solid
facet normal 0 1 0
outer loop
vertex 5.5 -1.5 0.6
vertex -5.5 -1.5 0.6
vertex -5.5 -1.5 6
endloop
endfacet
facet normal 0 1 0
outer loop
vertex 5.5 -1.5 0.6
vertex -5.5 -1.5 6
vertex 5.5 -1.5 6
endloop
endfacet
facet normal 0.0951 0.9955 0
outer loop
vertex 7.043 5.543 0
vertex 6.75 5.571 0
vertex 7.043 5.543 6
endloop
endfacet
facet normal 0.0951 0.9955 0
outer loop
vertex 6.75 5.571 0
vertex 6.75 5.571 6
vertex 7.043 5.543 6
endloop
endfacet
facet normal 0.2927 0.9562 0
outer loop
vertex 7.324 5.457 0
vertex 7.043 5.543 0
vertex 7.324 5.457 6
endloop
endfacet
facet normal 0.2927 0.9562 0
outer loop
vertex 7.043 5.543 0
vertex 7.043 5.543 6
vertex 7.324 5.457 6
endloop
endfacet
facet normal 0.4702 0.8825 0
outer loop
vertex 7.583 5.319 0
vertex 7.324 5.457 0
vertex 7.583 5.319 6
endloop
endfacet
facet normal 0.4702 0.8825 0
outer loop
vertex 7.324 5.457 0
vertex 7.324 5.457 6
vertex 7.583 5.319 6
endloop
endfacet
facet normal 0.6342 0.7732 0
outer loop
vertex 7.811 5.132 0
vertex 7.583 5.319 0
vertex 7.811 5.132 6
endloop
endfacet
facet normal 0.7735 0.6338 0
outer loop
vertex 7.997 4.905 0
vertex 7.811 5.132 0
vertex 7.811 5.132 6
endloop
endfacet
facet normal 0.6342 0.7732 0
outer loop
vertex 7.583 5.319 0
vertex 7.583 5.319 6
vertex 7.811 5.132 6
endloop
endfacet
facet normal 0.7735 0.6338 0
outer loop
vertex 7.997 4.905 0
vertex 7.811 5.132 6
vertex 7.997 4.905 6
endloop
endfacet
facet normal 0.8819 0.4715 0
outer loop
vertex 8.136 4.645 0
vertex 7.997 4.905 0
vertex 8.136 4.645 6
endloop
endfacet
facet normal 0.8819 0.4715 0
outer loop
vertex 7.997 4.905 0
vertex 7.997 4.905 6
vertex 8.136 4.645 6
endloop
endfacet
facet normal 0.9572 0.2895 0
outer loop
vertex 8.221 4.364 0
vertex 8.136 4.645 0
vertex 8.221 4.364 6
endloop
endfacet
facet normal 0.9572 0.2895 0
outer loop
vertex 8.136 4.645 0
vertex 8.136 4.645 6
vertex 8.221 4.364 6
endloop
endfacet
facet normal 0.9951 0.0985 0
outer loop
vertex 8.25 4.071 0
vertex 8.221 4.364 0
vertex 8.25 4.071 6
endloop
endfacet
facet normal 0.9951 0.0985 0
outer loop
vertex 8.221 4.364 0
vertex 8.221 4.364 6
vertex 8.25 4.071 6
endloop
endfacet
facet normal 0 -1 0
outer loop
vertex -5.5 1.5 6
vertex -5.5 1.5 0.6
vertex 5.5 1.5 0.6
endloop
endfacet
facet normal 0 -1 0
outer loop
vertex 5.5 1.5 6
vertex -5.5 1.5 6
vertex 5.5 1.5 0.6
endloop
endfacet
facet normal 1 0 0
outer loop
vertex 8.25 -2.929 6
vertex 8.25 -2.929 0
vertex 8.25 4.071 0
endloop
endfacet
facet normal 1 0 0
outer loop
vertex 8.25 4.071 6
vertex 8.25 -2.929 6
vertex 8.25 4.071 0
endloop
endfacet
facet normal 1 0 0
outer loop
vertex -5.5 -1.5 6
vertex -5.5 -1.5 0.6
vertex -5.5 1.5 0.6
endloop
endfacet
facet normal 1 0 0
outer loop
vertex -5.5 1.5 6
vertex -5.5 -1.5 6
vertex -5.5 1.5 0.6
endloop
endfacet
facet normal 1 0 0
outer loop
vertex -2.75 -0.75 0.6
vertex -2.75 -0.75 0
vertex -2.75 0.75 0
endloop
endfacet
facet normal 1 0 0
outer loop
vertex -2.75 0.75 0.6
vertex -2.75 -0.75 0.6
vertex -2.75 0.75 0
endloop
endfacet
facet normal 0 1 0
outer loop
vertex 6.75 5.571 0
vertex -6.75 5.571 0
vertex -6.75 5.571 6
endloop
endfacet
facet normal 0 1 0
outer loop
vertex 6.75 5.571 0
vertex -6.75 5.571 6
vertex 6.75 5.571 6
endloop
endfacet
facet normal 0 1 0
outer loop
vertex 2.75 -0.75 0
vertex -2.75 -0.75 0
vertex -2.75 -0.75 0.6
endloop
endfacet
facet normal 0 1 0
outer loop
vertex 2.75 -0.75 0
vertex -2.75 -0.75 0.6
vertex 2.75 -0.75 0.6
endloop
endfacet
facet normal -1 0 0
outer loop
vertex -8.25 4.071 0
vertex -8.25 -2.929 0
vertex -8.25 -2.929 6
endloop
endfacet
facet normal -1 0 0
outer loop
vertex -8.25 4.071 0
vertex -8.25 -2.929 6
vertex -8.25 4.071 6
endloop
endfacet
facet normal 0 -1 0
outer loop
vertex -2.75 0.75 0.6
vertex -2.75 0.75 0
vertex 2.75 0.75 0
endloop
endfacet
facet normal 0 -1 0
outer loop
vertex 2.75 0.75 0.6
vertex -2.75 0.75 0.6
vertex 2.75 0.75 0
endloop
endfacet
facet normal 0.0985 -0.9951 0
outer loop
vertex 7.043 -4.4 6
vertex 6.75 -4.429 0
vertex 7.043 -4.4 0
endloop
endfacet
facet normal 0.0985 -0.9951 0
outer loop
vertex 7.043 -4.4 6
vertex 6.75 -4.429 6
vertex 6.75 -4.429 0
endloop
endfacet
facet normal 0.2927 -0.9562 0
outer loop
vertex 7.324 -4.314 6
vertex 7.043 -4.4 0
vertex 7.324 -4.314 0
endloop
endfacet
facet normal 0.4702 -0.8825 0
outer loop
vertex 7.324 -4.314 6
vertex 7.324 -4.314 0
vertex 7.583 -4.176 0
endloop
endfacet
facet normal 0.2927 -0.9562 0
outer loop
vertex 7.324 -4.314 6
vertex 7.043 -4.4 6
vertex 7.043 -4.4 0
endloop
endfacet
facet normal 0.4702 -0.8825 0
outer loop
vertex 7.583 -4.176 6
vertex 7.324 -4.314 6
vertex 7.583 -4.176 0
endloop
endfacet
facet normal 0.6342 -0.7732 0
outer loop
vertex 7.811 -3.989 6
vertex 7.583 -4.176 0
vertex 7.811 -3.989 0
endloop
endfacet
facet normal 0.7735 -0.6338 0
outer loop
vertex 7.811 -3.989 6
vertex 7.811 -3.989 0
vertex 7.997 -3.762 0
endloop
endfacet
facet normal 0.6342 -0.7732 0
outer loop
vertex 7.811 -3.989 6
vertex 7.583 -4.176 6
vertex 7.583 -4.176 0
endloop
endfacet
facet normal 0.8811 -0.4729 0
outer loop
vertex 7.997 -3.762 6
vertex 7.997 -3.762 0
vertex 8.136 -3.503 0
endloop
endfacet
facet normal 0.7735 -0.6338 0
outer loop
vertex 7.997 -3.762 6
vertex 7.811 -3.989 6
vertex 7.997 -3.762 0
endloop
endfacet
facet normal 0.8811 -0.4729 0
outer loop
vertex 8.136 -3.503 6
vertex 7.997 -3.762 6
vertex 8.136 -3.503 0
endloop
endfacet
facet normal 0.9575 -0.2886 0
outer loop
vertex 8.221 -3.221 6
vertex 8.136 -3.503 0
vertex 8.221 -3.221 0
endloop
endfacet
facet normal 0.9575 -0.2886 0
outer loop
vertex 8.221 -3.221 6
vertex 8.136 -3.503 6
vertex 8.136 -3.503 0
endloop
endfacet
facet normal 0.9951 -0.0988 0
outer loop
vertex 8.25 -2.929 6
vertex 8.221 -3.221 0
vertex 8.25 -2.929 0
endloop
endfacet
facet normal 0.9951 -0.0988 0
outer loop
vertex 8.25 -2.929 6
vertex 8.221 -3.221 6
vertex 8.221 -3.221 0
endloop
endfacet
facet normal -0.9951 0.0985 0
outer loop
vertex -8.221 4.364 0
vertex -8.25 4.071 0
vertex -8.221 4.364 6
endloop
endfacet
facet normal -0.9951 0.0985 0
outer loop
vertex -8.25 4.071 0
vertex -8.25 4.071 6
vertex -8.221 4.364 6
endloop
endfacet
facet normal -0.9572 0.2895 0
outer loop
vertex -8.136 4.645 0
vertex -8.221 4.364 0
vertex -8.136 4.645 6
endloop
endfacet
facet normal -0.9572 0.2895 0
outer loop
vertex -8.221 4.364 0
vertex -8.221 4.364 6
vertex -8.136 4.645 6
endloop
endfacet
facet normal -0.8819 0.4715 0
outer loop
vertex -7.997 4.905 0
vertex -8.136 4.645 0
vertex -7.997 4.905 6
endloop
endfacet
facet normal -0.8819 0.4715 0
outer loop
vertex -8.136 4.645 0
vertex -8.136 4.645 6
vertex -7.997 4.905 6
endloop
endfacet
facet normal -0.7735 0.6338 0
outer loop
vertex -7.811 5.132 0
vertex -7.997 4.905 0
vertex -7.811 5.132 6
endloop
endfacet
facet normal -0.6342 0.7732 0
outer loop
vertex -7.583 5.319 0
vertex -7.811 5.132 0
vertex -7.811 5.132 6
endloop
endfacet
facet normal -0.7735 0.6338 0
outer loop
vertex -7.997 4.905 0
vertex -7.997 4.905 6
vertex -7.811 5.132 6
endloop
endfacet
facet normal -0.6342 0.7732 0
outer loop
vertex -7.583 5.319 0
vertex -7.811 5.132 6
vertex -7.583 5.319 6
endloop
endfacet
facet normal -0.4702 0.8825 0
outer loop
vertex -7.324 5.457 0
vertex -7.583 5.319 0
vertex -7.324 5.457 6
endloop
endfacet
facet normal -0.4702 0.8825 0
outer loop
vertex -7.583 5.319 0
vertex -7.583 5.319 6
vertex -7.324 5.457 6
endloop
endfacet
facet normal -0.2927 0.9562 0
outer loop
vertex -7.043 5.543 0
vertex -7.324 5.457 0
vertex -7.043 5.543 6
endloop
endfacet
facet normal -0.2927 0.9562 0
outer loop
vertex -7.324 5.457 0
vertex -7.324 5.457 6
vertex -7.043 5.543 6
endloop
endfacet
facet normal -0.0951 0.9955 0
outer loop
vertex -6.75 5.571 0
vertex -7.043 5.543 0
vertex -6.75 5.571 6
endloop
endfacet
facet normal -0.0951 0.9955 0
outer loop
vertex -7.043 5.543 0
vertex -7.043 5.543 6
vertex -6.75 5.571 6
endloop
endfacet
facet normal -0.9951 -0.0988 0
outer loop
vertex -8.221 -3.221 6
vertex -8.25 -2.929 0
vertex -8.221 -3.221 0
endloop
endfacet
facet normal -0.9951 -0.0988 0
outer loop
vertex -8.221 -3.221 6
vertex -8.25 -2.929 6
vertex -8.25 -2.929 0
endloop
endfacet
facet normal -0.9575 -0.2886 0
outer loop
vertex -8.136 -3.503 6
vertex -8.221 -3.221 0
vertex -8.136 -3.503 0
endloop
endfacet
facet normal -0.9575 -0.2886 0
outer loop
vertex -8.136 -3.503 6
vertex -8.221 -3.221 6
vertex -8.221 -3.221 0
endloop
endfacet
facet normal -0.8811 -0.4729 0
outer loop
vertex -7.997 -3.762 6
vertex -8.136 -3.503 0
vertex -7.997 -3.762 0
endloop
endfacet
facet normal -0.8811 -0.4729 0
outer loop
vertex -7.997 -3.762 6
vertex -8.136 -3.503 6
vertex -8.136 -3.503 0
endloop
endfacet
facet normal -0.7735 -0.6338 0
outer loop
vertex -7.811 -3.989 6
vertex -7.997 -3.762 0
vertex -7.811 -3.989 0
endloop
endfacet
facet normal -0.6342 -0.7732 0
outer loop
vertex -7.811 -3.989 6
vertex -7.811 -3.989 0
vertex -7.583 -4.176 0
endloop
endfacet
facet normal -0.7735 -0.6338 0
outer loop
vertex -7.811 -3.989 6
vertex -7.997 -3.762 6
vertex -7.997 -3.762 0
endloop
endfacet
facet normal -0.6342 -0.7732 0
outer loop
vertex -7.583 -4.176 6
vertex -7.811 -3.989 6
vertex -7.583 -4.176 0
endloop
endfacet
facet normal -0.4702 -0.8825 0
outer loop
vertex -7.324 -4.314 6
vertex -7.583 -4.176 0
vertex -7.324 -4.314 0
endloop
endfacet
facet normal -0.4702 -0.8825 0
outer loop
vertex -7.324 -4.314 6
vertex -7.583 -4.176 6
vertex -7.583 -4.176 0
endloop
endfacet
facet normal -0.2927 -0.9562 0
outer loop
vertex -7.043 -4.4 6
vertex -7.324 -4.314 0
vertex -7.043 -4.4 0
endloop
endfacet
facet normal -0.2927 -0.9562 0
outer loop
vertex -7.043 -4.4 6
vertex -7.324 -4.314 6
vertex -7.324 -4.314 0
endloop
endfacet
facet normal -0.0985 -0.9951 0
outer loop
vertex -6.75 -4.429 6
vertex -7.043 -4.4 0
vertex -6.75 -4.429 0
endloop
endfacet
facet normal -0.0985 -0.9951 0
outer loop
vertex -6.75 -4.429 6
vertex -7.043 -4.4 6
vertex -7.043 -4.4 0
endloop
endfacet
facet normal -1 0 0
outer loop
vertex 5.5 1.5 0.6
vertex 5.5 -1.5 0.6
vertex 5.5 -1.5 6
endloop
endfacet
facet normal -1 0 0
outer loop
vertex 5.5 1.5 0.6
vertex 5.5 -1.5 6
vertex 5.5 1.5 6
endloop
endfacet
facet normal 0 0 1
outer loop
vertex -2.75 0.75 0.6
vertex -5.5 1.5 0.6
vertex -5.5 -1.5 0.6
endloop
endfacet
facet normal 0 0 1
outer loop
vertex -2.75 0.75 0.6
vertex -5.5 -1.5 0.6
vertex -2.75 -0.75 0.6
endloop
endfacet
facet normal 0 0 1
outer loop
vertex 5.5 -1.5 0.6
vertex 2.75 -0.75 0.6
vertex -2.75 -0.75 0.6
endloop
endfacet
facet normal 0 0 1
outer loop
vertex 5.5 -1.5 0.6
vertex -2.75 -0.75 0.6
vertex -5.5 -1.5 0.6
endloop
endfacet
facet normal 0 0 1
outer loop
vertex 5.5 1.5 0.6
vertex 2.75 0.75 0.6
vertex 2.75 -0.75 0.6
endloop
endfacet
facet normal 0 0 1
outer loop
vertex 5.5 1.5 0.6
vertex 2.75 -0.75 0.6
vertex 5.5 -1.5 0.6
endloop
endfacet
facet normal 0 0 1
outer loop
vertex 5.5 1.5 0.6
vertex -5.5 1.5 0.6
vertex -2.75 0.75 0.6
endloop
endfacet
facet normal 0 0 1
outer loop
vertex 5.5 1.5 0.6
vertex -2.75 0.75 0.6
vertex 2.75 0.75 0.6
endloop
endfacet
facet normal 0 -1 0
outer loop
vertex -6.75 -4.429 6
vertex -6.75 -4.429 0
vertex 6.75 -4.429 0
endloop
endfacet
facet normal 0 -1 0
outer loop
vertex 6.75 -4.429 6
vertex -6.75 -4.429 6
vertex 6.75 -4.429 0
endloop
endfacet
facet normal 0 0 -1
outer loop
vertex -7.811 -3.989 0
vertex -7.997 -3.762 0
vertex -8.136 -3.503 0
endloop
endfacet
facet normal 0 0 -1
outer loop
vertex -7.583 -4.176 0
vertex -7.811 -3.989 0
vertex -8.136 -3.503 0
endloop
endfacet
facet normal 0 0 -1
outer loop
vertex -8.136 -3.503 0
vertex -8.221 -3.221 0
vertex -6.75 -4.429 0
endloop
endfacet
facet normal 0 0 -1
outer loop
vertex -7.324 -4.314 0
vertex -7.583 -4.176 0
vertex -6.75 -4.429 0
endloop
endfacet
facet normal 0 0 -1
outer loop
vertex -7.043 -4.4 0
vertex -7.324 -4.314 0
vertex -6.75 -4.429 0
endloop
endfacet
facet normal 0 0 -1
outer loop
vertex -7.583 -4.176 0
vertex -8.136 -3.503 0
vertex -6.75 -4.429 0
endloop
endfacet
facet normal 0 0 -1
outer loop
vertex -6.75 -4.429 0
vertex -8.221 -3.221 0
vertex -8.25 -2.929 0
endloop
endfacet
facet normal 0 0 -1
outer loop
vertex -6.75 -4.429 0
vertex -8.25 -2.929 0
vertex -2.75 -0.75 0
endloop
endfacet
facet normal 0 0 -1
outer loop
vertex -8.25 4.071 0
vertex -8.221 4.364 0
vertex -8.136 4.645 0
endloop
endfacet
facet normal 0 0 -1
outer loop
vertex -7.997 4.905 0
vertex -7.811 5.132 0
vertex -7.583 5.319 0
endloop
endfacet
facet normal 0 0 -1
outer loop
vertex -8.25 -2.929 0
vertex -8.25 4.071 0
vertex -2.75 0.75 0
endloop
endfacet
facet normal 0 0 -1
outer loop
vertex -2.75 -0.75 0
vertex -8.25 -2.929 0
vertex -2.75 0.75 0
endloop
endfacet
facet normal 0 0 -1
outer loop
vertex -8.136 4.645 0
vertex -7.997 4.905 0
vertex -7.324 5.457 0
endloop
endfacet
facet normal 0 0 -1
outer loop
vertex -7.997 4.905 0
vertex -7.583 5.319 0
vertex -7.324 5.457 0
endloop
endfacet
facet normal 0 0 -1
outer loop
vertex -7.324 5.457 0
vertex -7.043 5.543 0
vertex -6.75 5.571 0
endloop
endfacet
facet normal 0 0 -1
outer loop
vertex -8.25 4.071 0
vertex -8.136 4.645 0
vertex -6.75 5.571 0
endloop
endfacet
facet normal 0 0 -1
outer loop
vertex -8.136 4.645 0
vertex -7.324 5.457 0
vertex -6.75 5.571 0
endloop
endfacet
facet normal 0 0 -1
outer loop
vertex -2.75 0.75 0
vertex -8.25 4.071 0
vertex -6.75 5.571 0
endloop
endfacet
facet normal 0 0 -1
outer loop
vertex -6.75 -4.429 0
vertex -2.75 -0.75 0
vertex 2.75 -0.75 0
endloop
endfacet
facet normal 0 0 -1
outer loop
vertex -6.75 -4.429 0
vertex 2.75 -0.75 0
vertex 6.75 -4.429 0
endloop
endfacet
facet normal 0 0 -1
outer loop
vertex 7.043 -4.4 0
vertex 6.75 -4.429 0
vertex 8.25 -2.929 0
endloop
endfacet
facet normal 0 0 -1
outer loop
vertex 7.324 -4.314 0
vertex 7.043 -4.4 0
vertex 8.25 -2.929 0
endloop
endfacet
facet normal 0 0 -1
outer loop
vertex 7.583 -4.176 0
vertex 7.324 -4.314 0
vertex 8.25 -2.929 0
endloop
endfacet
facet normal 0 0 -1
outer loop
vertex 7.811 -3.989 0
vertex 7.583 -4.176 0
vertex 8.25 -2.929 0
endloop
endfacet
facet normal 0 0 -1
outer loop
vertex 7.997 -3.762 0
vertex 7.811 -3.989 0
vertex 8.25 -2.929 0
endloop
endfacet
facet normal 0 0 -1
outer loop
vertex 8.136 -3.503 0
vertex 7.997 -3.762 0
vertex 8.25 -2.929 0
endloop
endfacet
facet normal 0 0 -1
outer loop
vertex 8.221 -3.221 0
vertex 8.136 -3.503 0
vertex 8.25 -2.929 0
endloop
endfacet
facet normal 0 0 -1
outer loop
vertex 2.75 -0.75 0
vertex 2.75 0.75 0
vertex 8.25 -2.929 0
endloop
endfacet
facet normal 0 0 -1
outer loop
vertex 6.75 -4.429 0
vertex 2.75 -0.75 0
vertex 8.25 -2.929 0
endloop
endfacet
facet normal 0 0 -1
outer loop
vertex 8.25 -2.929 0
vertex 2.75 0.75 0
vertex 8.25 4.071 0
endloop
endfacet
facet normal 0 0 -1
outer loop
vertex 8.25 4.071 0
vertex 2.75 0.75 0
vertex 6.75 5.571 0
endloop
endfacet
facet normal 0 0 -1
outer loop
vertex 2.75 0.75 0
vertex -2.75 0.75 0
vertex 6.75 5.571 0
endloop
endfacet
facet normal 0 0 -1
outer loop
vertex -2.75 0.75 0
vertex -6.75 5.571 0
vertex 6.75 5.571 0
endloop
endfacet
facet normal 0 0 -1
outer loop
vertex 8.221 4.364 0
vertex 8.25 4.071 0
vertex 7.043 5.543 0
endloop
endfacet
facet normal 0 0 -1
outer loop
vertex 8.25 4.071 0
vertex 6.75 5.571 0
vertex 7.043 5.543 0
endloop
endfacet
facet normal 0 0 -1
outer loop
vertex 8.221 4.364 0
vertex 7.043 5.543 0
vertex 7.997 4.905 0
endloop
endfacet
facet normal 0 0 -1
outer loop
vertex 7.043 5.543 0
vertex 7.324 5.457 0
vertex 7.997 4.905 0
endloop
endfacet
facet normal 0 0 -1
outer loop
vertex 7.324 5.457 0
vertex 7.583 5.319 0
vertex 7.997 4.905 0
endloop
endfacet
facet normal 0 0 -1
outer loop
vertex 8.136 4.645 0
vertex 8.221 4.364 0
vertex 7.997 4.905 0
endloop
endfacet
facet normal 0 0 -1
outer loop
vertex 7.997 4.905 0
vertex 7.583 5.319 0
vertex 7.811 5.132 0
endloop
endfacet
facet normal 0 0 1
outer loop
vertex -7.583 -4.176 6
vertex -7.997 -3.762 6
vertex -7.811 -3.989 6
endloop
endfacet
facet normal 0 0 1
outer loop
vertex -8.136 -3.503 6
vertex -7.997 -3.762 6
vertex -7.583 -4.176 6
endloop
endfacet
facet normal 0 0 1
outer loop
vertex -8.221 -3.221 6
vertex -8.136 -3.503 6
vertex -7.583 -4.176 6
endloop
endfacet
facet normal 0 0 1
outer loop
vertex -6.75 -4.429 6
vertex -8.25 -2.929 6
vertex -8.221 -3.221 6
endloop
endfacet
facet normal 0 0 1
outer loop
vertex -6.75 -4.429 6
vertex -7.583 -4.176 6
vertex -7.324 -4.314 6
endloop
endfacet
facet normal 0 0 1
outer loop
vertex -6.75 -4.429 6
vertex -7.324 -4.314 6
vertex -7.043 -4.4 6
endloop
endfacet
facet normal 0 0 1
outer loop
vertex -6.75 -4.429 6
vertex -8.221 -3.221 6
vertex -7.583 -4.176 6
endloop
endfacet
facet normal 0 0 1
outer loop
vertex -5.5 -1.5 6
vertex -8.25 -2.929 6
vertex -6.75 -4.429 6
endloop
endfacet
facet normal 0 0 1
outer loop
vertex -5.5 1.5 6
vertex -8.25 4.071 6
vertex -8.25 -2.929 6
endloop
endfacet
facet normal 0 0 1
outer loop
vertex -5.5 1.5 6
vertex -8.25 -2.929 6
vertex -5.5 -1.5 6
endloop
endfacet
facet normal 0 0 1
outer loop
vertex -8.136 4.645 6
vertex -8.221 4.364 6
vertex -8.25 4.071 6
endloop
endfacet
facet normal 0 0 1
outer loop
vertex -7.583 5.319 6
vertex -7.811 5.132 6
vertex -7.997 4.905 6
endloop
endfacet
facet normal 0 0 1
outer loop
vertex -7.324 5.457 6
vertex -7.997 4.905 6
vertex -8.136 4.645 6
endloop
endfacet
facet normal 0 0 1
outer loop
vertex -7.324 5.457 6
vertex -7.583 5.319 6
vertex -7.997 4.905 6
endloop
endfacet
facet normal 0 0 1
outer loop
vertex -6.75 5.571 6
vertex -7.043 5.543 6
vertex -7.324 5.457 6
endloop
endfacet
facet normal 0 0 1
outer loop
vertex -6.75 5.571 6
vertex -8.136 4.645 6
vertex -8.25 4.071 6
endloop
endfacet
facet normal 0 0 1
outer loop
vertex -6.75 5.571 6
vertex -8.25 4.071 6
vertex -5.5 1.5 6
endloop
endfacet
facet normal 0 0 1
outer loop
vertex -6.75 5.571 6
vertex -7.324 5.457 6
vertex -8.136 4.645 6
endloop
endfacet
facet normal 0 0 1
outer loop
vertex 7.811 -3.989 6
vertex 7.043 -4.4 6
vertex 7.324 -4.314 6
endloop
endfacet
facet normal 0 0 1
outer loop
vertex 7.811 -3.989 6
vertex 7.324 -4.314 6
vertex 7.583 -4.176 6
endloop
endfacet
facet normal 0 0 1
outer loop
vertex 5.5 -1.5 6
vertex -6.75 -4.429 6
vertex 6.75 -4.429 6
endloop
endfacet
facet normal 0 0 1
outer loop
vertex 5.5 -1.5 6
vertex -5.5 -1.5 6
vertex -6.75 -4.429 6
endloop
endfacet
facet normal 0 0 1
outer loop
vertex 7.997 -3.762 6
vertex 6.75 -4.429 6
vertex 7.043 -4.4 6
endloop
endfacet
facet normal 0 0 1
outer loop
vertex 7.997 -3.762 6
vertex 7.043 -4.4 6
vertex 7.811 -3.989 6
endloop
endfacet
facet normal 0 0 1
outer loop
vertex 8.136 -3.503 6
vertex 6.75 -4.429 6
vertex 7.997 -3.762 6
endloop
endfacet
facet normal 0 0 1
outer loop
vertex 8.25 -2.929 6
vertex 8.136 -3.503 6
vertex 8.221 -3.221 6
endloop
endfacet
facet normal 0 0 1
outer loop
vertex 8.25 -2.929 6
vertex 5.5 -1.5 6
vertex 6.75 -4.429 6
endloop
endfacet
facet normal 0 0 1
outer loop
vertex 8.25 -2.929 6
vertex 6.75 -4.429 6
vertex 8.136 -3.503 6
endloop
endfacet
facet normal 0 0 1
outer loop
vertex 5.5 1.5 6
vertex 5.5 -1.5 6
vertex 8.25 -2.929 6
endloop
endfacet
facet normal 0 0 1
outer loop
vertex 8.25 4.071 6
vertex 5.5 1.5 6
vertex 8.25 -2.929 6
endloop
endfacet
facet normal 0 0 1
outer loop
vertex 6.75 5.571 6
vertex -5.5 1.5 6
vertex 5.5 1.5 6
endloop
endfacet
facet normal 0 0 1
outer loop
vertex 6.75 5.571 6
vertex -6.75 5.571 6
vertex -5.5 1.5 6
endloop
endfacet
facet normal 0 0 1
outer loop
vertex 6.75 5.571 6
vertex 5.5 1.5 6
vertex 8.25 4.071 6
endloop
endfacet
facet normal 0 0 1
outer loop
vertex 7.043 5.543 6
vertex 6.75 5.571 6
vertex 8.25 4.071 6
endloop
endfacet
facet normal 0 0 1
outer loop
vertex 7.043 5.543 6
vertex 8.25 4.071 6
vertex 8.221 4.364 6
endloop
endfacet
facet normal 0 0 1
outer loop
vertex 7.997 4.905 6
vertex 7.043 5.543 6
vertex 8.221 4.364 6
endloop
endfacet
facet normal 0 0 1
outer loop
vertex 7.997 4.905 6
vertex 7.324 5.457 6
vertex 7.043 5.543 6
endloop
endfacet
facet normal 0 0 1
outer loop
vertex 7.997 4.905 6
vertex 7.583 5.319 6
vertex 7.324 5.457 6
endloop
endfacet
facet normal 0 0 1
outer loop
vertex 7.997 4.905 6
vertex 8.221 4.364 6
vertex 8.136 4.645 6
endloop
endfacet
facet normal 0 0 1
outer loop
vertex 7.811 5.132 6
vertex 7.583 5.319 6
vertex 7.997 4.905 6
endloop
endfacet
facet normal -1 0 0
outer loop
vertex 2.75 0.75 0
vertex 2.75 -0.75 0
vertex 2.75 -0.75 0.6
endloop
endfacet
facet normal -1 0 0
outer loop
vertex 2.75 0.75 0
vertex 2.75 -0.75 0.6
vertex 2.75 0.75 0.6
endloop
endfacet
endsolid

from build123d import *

# Parameters (mm, degrees)
F0_W     = 16.5
F0_H     = 10
F0_W_2   = 11
F0_H_2   = 3
F1_DEPTH = 6
F2_R     = 1.5
F0_W_3   = 5.5
F0_H_3   = 1.5
F3_DEPTH = 0.6


with BuildPart() as f1:
    # F0 (on Top) → F1 (new body)
    with BuildSketch(Plane.XY):
        with Locations((0, 0.571325)):
            Rectangle(F0_W, F0_H)
        Rectangle(F0_W_2, F0_H_2, mode=Mode.SUBTRACT)
    extrude(amount=F1_DEPTH)

    # F2
    f2_edges = [f1.edges().sort_by_distance(p)[0] for p in [
        (-8.25, 5.571325, 3),
        (8.25, 5.571325, 3),
        (8.25, -4.428675, 3),
        (-8.25, -4.428675, 3),
    ]]
    fillet(f2_edges, radius=F2_R)

    # F0 (on Top) → F3 (join)
    with BuildSketch(Plane.XY):
        Rectangle(F0_W_2, F0_H_2)
        Rectangle(F0_W_3, F0_H_3, mode=Mode.SUBTRACT)
    extrude(amount=F3_DEPTH)


solid = f1.part
